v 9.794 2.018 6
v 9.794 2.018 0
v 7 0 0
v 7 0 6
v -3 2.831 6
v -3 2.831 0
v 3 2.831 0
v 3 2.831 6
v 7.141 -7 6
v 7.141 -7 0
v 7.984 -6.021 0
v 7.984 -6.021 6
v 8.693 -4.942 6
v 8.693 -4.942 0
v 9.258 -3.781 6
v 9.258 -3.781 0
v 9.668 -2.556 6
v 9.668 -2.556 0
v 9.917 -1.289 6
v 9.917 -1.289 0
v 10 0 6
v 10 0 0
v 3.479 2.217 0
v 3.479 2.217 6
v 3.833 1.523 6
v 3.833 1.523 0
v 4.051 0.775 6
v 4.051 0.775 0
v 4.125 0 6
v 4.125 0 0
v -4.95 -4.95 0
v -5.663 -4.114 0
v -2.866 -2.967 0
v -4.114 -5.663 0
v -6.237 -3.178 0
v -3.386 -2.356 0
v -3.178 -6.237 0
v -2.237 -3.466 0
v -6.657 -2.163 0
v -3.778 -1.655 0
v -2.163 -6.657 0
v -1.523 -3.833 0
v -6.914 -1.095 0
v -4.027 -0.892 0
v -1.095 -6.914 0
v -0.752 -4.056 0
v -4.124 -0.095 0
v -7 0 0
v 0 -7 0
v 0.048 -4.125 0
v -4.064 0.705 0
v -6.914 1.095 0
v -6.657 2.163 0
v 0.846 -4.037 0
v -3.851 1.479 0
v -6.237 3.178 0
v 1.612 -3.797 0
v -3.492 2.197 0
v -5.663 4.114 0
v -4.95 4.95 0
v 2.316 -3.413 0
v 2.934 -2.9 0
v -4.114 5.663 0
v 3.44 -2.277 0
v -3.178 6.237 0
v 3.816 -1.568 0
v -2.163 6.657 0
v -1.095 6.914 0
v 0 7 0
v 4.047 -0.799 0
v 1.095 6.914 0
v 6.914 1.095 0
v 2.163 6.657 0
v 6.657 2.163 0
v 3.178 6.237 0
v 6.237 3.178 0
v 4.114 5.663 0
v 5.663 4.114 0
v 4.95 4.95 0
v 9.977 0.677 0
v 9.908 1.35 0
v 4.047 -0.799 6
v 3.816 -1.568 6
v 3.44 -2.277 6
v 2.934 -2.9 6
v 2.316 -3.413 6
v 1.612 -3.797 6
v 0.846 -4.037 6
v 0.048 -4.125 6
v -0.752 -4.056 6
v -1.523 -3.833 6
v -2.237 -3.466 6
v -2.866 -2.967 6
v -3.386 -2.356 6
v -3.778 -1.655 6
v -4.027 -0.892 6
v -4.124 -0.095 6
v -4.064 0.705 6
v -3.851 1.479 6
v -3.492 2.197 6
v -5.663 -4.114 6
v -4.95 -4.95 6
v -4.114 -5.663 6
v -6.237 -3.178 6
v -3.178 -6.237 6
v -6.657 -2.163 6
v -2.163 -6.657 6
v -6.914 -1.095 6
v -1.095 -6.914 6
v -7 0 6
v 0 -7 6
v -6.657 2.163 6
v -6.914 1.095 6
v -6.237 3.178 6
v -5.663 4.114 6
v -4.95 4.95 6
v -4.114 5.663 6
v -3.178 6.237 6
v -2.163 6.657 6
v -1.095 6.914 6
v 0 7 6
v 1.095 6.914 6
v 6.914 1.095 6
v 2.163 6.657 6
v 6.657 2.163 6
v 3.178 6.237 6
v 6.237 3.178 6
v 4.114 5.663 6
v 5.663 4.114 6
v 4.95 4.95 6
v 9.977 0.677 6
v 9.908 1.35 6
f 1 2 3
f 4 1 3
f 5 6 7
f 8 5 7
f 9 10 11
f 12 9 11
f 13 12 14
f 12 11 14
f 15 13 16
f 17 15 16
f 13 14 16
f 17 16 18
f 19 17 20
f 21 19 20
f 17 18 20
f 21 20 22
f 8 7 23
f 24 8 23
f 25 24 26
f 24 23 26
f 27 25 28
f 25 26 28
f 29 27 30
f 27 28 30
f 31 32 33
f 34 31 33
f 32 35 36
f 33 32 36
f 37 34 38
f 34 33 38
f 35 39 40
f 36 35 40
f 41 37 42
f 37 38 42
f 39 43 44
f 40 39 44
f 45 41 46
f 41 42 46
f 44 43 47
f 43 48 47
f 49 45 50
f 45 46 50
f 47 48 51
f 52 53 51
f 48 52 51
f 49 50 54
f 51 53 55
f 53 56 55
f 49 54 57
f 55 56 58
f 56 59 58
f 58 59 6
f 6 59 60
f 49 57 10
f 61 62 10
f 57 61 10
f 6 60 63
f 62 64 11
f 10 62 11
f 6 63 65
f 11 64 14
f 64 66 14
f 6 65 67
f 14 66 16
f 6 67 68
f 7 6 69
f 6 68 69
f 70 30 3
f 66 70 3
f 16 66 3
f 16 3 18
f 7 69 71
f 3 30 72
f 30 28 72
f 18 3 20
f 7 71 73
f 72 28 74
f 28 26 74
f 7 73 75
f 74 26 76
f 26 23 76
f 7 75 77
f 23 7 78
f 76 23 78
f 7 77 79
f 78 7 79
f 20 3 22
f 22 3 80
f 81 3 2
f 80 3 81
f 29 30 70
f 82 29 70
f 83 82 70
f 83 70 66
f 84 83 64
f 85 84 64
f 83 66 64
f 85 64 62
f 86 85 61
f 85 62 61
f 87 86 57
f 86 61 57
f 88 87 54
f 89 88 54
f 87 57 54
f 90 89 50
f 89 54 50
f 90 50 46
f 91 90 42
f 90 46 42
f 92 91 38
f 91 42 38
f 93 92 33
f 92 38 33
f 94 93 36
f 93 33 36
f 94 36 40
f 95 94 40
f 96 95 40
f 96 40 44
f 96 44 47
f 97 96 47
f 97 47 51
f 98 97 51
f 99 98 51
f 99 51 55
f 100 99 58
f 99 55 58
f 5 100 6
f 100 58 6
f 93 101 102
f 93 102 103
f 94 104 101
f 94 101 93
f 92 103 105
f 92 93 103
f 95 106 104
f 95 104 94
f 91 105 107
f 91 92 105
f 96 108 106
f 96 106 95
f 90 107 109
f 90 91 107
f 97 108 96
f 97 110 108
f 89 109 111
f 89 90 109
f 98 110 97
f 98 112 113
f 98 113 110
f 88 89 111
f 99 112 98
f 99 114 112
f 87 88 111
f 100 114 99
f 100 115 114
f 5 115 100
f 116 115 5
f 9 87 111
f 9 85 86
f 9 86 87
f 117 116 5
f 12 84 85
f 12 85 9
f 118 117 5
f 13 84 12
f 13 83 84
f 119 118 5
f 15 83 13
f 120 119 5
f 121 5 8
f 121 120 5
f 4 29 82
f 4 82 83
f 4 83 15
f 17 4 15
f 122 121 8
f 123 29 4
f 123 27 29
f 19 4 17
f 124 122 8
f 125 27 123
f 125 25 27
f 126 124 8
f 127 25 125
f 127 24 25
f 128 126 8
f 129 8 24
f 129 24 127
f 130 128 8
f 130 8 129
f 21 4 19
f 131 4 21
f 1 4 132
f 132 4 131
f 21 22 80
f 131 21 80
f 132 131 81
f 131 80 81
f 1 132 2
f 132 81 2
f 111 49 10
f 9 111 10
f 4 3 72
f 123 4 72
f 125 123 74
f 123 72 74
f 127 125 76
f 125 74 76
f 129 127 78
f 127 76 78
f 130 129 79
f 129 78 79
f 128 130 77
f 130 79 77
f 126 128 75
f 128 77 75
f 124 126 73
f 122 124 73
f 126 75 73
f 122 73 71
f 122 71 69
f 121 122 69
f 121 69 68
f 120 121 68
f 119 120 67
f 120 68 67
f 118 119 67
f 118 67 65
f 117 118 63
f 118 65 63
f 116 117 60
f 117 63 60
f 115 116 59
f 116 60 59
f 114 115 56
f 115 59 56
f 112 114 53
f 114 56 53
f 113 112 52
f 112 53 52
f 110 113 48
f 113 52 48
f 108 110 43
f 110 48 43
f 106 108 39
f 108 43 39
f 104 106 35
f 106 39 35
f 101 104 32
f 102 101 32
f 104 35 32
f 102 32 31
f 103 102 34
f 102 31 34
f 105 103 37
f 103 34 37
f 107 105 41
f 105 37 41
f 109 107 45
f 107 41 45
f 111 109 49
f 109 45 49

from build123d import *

# Parameters (mm, degrees)
F1_DEPTH = 6


# Not quite as in the source:
# - a feature names something its author has since deleted; it is built from what else it names


with BuildPart() as f1:
    # F0 (on Top) → F1 (new body)
    with BuildSketch(Plane.XY):
        with BuildLine():
            ThreePointArc((0, -7), (4.9497474683, -4.9497474683), (7, 0))
            ThreePointArc((7, 0), (-4.9497474683, 4.9497474683), (0, -7))
        make_face()
        with BuildLine():
            ThreePointArc((3, 2.8311879132), (3.8334465563, 1.5232572009), (4.125, 0))
            ThreePointArc((4.125, 0), (-1.5232572009, -3.8334465563), (-3, 2.8311879132))
            ThreePointArc((-3, 2.8311879132), (0, 4.125), (3, 2.8311879132))
        make_face(mode=Mode.SUBTRACT)
        with BuildLine():
            Line((-3, 2.8311879132), (3, 2.8311879132))
            ThreePointArc((3, 2.8311879132), (0, 4.125), (-3, 2.8311879132))
        make_face()
        with BuildLine():
            ThreePointArc((7.1414284285, -7), (9.2578151927, -3.7805896177), (10, 0))
            ThreePointArc((10, 0), (9.9484557051, 1.0140163134), (9.7943541832, 2.0175792755))
            Line((9.7943541832, 2.0175792755), (7, 0))
            ThreePointArc((7, 0), (4.9497474683, -4.9497474683), (0, -7))
            Line((0, -7), (7.1414284285, -7))
        make_face()
    extrude(amount=F1_DEPTH)


solid = f1.part
